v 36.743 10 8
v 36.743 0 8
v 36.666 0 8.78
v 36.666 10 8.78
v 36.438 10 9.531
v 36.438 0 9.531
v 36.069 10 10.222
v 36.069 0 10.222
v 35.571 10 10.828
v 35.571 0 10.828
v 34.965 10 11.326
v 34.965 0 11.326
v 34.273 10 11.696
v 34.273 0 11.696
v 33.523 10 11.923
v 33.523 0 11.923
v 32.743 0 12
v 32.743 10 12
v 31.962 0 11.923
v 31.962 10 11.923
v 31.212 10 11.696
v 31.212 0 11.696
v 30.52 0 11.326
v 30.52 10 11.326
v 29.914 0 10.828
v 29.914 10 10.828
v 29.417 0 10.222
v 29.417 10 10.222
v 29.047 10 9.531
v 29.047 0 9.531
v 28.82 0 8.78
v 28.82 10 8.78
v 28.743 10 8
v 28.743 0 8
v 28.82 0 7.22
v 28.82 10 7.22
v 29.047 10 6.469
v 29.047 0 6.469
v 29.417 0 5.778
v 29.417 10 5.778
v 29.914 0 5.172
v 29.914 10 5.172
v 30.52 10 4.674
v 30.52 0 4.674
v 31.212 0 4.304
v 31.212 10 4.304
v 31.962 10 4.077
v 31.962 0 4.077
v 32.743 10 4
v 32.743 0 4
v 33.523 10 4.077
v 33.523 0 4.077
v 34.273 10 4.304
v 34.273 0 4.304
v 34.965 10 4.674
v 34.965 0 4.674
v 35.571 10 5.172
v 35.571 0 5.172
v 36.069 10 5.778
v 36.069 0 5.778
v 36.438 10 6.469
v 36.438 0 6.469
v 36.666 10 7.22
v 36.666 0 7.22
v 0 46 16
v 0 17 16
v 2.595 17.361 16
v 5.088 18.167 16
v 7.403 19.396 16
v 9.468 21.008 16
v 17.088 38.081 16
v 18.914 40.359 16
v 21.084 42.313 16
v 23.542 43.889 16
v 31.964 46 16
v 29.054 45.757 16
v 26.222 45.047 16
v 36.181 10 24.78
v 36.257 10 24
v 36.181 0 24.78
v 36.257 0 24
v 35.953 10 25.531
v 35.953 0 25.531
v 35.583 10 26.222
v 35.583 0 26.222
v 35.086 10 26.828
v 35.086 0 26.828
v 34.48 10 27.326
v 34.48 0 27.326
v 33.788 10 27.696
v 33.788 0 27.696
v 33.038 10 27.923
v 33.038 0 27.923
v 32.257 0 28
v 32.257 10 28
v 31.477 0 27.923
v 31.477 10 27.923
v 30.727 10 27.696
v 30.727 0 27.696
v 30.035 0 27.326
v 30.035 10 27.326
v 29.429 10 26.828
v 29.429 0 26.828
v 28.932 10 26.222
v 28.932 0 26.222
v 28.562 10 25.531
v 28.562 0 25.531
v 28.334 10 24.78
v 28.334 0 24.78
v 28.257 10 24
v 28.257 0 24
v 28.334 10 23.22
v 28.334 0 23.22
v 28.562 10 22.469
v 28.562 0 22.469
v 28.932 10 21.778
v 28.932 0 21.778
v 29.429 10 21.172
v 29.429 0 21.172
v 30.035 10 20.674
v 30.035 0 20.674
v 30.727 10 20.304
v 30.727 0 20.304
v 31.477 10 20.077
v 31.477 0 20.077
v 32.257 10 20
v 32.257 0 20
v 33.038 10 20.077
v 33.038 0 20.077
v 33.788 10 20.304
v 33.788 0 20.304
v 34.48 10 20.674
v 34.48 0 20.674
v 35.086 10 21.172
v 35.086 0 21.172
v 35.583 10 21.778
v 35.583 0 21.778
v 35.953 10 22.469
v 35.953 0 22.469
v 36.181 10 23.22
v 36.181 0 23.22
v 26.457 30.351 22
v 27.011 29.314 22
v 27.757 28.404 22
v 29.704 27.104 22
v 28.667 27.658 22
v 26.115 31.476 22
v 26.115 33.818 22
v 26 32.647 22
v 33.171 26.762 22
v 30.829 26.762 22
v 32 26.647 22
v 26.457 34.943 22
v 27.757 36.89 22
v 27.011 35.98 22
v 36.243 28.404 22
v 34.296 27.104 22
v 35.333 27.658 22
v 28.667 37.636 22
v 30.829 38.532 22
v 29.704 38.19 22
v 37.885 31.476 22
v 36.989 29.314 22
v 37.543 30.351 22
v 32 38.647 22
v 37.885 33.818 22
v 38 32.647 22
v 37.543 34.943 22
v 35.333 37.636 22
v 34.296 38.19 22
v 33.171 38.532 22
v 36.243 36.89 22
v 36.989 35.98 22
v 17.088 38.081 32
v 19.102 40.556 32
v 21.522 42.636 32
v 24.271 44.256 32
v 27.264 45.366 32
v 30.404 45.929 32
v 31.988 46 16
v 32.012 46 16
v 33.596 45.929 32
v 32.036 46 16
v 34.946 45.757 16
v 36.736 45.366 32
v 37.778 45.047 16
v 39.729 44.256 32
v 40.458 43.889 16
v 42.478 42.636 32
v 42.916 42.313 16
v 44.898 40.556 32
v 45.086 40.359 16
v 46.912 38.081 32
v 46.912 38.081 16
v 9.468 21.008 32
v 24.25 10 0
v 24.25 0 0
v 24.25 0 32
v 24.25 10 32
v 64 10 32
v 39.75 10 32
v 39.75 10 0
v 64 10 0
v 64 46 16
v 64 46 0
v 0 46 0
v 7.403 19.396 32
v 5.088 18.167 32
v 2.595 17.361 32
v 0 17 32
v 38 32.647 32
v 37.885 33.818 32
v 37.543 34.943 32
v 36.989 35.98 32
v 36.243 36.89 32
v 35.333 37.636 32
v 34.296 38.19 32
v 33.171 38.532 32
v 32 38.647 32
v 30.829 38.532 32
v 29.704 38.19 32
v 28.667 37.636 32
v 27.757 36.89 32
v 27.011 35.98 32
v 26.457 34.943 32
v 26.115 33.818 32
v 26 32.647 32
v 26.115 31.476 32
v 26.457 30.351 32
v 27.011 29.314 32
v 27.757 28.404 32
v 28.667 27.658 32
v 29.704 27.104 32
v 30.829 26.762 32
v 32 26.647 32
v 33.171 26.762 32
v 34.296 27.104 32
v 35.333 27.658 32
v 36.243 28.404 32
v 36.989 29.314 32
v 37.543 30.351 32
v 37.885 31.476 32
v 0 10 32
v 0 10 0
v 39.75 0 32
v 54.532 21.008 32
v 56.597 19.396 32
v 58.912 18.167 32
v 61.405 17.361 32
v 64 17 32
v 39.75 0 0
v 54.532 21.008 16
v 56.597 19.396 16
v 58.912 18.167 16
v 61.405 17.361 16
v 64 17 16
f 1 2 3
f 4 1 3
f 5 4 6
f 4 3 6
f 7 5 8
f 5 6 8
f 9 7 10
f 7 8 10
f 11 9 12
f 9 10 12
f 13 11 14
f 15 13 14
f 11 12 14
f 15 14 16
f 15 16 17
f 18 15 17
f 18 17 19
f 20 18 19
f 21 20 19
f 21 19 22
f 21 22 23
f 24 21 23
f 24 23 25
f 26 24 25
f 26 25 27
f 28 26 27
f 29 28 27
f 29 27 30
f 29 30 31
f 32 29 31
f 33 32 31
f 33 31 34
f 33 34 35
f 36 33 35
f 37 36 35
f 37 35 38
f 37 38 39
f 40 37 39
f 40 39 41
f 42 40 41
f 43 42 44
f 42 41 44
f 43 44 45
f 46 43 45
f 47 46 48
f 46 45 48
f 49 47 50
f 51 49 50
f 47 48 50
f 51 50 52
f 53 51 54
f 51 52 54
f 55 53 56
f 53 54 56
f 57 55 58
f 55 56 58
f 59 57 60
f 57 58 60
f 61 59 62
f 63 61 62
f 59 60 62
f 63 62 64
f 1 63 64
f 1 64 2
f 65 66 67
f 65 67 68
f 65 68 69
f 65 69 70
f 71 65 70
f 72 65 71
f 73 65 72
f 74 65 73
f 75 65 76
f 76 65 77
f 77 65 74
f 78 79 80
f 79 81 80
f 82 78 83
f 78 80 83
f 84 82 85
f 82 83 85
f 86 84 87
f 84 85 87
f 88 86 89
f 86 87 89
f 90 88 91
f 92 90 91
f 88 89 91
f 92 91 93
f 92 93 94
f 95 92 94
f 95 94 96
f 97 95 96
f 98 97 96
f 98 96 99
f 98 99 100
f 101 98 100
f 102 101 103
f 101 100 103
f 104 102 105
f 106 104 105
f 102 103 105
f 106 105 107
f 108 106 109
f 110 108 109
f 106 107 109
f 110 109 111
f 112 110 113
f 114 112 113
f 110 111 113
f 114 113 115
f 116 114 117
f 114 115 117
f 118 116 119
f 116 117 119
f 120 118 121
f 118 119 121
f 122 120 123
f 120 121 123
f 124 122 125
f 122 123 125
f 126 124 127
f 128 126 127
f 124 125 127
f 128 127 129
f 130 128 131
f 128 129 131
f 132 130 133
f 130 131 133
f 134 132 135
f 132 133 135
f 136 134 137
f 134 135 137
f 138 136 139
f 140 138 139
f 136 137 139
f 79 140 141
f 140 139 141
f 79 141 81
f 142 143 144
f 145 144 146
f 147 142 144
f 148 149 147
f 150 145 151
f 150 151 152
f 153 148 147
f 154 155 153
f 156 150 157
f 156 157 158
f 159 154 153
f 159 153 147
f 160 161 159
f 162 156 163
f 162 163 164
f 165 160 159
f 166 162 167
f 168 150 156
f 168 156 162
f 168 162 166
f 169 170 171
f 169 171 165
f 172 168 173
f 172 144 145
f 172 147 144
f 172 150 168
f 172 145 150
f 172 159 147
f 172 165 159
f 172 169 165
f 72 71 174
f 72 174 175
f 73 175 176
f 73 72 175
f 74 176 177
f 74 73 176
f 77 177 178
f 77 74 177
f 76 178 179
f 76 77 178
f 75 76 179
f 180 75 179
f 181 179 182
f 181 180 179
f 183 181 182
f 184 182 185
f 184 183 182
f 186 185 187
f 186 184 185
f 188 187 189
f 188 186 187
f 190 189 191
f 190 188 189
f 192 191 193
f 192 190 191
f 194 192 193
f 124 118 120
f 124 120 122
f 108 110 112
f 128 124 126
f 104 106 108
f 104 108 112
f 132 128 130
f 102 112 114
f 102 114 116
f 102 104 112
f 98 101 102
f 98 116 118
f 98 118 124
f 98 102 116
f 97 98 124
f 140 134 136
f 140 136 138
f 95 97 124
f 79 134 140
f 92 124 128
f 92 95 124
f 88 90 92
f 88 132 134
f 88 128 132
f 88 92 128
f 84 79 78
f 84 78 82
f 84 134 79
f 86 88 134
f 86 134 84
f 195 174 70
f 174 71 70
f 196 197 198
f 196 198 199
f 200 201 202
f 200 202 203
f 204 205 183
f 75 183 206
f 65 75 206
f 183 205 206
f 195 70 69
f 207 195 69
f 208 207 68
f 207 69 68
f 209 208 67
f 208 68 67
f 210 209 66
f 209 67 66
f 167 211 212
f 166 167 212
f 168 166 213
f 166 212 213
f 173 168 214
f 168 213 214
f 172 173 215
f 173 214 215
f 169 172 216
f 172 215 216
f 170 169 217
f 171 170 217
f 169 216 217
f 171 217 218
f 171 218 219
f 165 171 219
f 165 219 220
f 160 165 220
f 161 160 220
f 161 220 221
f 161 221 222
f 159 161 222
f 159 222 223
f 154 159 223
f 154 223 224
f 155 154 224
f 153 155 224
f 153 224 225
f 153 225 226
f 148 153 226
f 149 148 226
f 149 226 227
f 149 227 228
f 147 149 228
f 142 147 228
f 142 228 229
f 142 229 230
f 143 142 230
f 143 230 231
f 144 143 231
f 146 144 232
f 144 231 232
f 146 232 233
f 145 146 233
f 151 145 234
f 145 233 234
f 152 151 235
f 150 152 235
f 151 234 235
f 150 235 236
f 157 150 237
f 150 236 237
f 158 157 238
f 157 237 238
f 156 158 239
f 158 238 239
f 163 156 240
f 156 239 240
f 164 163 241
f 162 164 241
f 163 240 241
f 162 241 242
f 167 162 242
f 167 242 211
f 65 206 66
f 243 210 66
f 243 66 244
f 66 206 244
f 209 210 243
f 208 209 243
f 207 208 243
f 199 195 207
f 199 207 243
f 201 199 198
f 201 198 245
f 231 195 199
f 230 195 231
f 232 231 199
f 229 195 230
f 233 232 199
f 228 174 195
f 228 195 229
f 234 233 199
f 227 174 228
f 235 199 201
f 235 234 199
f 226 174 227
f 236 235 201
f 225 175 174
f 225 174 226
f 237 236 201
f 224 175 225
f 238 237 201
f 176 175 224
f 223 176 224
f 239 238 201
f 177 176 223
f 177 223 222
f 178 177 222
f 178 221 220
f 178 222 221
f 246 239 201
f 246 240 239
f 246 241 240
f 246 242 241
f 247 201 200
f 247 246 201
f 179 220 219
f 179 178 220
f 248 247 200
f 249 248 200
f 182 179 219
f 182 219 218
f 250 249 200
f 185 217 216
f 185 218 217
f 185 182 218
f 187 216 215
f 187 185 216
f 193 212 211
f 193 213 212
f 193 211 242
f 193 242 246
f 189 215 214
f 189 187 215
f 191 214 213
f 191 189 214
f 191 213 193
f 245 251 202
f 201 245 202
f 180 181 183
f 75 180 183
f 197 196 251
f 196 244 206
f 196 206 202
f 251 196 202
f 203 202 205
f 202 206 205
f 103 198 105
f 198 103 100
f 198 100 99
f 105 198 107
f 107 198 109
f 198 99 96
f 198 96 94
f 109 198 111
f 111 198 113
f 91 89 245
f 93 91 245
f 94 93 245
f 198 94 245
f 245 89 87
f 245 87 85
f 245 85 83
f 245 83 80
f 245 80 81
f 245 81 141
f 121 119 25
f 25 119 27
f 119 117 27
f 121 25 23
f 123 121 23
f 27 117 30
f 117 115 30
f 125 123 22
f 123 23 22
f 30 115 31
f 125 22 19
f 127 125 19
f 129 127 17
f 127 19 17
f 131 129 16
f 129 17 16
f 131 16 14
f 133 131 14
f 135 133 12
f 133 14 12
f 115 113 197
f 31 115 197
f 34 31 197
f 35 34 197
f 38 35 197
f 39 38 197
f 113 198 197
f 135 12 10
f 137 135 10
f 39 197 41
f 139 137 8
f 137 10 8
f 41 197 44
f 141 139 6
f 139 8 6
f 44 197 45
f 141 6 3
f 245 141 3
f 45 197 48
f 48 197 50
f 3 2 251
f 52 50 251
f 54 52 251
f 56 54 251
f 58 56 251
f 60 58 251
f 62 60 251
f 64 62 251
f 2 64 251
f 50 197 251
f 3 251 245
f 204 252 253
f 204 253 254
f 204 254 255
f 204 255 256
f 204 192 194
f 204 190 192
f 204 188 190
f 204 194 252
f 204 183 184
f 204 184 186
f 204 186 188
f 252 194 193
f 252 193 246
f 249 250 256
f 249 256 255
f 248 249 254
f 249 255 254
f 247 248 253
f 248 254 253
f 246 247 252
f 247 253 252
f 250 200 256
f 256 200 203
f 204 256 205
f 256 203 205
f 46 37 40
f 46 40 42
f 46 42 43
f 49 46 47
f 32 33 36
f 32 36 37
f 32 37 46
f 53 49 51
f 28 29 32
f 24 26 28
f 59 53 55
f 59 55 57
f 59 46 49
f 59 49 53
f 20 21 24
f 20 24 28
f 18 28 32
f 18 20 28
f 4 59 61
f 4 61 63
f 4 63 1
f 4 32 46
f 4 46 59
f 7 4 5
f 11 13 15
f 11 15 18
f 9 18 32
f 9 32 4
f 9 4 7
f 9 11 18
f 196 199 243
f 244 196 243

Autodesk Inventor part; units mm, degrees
ref_plane "YZ Plane" through (0, 0, 0) normal (1, 0, 0) x (0, 1, 0)
ref_plane "XZ Plane" through (0, 0, 0) normal (0, 1, 0) x (-1, 0, 0)
ref_plane "XY Plane" through (0, 0, 0) normal (0, 0, 1) x (1, 0, 0)
sketch "Sketch1" plane through (0, 0, 0) normal (0, 0, 1) x (1, 0, 0)
  line L0 (24.25, 0) -> (39.75, 0)
  line L1 (64, 10) -> (64, 46)
  line L2 (64, 46) -> (0, 46)
  line L3 (0, 46) -> (0, 10)
  line L4 (24.25, 0) -> (24.25, 10)
  line L5 (24.25, 10) -> (0, 10)
  line L6 (39.75, 0) -> (39.75, 10)
  line L7 (39.75, 10) -> (64, 10)
  point P0 (0, 0)
  dimension "d0" = 64
  dimension "d2" = 24.25
  dimension "d3" = 10
extrude "Extrusion1" add sketch "Sketch1" along normal blind 16
sketch "Sketch2" plane through (0, 0, 16) normal (0, 0, 1) x (1, 0, 0)
  line L0 (24.25, 10) -> (24.25, 0) projected
  line L1 (24.25, 10) -> (24.25, 0)
  line L2 (24.25, 0) -> (39.75, 0) projected
  line L3 (24.25, 0) -> (39.75, 0)
  line L4 (39.75, 0) -> (39.75, 10) projected
  line L5 (39.75, 0) -> (39.75, 10)
  line L6 (39.75, 10) -> (64, 10) projected
  line L7 (39.75, 10) -> (64, 10)
  line L8 (64, 10) -> (64, 17)
  line L9 (64, 10) -> (64, 46) projected
  line L10 (0, 10) -> (24.25, 10) projected
  line L11 (0, 10) -> (0, 17)
  line L12 (0, 46) -> (0, 10) projected
  arc A0 (0, 17) -> (9.4683, 21.008) centre (-0.759, 31.9808) ccw
  arc A1 (54.5317, 21.008) -> (64, 17) centre (64.759, 31.9808) ccw
  line L13 (17.0879, 38.0812) -> (9.4683, 21.008)
  line L14 (46.9121, 38.0812) -> (54.5317, 21.008)
  arc A2 (46.9121, 38.0812) -> (17.0879, 38.0812) centre (32, 28) ccw
  point P0 (0, 0)
  dimension "d7" = 7
  dimension "d9" = 30
  dimension "d10" = 30
  dimension "d11" = 7
extrude "Extrusion2" add sketch "Sketch2" along normal blind 16
sketch "Sketch3" plane through (0, 0, 32) normal (0, 0, 1) x (1, 0, 0)
  circle A0 centre (32, 32.647) radius 6
  line L0 (0, 46) -> (0, 17) projected
  line L1 (64, 17) -> (64, 46) projected
  point P0 (0, 0)
  dimension "d14" = 12
  dimension "d15" = 32
  dimension "d16" = 32
extrude "Extrusion3" cut sketch "Sketch3" against normal blind 10
sketch "Sketch5" plane through (24.25, 0, 0) normal (0, -1, 0) x (1, 0, 0)
  circle A0 centre (8.0074, 24) radius 4
  circle A1 centre (8.4927, 8) radius 4
  line L0 (0, 32) -> (15.5, 32) projected
  line L1 (0, 0) -> (15.5, 0) projected
  point P0 (-24.25, 0)
  dimension "d22" = 8
  dimension "d23" = 8
  dimension "d26" = 8
  dimension "d27" = 8
extrude "Extrusion5" cut sketch "Sketch5" against normal blind 10
properties part number "pieza 4. MRKE" material "Steel, Wrought"
